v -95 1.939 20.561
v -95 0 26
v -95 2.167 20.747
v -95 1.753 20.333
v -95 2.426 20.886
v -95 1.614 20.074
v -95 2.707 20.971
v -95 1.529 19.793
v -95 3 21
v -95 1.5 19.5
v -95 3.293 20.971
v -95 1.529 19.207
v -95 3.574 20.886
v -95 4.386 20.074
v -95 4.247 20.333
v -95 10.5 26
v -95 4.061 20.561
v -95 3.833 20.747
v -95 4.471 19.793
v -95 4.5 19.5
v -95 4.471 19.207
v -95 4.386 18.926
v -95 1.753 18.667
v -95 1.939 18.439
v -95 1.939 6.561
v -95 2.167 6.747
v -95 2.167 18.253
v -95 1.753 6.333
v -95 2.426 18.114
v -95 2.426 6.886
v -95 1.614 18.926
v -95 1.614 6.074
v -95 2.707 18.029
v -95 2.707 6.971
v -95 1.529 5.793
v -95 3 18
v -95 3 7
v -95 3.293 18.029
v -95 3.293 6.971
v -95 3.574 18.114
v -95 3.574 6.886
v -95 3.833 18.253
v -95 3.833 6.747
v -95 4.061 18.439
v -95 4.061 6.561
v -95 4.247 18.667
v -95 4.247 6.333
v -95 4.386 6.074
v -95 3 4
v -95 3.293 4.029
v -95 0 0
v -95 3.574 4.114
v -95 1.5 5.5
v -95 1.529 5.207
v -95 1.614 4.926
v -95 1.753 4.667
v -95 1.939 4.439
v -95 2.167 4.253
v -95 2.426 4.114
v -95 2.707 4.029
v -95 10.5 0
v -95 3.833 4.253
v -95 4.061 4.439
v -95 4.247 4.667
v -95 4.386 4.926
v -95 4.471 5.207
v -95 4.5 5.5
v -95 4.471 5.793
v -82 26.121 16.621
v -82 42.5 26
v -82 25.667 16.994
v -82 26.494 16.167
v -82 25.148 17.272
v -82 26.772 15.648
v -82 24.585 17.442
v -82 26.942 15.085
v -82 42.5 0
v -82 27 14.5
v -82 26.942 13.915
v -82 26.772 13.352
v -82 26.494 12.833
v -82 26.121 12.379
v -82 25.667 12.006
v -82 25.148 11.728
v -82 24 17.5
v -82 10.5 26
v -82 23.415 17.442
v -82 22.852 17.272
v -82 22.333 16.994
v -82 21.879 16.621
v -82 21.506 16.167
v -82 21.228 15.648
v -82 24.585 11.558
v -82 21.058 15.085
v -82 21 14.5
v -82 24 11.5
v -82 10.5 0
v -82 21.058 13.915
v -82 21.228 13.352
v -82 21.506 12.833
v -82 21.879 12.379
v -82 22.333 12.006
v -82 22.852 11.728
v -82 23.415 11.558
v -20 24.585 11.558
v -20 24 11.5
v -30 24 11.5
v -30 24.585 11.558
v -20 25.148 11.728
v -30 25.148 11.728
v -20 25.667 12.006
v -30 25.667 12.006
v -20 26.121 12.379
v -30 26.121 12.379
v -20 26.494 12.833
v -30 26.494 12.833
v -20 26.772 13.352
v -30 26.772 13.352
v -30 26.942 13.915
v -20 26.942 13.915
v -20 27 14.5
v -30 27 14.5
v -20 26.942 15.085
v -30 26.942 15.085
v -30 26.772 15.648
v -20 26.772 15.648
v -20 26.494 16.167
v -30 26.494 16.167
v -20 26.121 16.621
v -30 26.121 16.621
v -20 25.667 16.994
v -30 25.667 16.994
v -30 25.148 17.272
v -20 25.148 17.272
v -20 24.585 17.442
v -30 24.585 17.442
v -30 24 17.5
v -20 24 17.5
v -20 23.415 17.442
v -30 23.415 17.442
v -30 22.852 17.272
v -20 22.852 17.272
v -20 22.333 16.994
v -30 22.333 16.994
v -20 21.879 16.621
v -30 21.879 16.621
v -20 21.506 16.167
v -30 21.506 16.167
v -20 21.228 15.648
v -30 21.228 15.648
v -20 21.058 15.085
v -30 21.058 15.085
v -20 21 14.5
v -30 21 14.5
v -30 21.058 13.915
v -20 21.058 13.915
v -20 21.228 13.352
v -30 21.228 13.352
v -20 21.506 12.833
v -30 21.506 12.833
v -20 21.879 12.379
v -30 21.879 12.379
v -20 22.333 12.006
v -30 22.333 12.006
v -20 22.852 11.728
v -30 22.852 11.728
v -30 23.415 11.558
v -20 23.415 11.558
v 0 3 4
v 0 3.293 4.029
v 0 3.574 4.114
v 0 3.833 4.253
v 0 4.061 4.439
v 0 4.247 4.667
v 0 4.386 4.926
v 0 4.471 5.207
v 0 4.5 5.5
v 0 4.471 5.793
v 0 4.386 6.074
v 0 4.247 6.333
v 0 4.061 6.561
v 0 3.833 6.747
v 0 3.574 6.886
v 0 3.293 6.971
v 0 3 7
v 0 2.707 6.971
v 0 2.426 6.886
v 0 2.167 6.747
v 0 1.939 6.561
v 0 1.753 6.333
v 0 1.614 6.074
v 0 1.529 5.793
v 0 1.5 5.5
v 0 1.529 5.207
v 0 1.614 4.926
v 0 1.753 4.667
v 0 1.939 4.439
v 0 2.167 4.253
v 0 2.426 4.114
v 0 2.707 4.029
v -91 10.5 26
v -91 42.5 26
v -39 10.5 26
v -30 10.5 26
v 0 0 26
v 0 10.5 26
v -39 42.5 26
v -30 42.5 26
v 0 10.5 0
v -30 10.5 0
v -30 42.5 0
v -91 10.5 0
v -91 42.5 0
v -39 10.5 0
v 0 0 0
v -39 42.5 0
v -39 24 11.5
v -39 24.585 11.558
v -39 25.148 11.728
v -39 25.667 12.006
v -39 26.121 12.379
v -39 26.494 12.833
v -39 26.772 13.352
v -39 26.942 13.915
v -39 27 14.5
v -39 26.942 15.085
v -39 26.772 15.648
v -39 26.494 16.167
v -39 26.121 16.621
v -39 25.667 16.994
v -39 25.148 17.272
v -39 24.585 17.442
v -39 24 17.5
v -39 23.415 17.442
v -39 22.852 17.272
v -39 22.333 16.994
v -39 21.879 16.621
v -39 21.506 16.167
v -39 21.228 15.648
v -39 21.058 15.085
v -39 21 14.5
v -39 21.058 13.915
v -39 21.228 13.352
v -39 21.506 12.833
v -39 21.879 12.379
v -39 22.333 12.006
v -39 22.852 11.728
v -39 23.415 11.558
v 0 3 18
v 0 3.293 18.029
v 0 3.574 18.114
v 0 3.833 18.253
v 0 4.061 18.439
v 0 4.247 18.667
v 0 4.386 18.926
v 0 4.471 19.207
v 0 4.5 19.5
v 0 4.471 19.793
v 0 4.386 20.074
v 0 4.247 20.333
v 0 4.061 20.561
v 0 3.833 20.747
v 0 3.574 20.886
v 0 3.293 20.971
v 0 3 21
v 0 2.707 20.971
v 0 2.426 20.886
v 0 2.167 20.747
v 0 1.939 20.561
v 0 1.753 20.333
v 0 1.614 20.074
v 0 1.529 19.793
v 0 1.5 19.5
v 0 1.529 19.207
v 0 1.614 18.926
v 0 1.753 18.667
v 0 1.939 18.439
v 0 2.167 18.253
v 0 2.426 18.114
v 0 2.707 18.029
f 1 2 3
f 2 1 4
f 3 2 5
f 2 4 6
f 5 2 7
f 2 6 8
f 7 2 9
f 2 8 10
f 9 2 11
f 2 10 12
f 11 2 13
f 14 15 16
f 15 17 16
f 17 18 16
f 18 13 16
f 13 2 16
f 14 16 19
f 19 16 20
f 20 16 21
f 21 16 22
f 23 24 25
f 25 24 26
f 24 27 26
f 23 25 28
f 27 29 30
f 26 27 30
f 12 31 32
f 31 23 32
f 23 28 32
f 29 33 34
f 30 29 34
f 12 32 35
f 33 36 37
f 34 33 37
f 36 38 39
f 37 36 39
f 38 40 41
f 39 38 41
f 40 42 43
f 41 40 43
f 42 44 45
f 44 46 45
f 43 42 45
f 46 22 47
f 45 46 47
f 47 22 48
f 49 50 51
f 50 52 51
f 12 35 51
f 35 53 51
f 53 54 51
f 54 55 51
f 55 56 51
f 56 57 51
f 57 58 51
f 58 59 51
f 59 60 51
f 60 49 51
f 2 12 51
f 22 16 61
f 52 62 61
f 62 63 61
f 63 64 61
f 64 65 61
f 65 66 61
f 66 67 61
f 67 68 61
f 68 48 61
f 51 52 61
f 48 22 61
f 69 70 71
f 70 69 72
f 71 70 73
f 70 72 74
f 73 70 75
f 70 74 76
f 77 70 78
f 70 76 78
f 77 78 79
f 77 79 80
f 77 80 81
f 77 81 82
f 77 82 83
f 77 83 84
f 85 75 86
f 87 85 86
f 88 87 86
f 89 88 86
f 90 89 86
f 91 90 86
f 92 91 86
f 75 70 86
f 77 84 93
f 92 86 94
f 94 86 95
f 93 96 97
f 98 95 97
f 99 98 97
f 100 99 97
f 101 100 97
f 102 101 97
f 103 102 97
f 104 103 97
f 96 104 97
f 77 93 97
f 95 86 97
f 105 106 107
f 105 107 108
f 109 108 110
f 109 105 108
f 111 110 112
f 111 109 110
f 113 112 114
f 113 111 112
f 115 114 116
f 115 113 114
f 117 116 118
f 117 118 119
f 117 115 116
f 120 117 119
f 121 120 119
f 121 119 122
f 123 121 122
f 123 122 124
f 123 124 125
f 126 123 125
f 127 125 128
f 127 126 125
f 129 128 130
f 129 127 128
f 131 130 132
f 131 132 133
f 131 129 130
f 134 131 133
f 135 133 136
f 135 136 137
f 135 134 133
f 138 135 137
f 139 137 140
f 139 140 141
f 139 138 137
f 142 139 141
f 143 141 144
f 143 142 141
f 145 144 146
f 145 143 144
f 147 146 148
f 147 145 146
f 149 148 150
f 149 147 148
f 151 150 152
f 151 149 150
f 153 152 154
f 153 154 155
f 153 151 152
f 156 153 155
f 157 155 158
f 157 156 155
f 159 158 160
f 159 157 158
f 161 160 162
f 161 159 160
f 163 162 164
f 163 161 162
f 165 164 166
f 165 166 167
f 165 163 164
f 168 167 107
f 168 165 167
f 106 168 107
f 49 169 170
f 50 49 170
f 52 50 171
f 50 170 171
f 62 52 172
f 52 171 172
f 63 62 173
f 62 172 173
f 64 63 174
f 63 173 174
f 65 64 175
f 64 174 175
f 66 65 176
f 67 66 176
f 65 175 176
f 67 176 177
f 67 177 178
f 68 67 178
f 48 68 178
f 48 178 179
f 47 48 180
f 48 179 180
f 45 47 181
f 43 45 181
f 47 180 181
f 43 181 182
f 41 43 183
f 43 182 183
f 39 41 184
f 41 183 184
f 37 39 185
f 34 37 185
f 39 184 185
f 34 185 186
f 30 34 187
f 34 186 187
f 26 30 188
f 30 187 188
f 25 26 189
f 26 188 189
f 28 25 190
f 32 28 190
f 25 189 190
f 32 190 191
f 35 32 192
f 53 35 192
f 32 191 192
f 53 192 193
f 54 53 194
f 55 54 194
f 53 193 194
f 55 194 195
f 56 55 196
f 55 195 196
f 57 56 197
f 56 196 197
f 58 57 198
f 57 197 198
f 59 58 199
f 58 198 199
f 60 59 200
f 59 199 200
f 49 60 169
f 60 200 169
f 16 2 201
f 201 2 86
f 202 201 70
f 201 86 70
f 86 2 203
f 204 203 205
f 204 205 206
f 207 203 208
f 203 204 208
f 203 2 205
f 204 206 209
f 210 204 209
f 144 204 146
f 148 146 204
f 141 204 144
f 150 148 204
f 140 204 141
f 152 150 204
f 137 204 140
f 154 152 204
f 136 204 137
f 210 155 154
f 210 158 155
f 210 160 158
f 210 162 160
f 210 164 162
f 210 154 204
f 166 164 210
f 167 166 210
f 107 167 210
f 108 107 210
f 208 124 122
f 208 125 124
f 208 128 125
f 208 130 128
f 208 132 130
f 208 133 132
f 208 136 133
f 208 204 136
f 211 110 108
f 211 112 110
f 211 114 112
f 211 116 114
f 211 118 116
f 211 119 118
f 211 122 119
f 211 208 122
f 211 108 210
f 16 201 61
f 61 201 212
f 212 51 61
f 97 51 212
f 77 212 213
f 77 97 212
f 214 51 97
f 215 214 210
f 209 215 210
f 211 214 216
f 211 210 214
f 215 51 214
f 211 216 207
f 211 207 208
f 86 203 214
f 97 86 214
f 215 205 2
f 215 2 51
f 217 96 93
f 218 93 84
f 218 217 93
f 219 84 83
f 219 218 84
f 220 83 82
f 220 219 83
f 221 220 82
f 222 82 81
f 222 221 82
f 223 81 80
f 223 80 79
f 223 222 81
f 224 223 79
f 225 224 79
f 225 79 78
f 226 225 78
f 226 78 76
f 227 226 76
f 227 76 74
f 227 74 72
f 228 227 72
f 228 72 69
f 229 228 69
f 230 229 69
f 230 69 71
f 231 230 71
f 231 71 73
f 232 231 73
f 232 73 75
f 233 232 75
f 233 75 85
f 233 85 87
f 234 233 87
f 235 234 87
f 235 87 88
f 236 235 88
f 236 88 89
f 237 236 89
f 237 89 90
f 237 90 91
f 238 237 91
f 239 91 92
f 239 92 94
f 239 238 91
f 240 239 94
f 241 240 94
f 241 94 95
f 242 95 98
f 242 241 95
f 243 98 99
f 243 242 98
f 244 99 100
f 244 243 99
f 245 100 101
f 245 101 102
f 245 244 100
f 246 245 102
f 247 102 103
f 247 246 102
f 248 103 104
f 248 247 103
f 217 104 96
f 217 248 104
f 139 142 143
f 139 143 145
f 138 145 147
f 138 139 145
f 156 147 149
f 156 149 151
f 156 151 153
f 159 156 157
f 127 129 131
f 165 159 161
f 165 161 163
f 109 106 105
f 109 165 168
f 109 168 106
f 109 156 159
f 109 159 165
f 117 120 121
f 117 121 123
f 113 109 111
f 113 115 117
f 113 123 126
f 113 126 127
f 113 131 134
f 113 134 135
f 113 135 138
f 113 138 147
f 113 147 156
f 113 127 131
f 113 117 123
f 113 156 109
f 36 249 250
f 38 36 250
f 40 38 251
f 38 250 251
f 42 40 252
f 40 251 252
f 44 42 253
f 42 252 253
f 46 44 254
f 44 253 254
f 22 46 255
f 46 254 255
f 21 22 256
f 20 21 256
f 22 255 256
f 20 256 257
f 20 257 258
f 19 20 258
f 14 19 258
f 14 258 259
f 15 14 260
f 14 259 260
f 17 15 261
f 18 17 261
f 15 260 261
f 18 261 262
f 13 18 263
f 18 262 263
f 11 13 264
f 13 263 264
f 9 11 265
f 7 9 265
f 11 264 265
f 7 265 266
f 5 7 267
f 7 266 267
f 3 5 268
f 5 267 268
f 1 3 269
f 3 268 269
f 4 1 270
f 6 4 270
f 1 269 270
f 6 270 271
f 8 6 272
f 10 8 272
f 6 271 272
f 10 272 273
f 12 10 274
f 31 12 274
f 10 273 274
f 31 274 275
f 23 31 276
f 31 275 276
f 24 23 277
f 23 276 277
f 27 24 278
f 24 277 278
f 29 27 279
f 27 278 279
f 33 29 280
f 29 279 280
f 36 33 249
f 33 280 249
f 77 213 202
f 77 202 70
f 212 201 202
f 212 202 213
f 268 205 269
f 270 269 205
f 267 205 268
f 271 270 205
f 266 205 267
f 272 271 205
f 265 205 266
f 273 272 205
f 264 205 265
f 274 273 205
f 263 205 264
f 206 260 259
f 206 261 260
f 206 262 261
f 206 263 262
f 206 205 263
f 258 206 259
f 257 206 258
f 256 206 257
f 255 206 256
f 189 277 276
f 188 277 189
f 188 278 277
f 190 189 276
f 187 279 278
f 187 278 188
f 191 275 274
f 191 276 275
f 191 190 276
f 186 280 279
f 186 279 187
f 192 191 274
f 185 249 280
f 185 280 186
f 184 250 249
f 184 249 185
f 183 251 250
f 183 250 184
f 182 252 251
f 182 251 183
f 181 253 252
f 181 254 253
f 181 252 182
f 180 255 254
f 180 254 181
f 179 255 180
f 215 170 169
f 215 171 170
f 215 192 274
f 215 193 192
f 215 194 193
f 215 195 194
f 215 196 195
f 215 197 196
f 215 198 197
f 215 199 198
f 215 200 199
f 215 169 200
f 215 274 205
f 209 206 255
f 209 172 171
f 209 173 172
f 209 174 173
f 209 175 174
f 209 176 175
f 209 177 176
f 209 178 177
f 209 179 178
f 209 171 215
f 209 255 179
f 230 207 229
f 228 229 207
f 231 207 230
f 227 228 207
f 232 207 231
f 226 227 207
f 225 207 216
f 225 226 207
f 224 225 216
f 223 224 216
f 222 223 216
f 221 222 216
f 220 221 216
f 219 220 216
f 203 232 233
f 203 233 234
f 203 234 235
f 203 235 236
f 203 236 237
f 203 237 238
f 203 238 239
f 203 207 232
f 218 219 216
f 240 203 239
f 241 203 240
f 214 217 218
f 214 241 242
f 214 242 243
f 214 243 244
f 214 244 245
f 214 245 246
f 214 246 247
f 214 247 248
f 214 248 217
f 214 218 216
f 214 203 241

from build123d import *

# Parameters (mm, degrees)
SKETCH_1_W      = 26
SKETCH_1_H      = 10.5
SKETCH_1_R      = 1.5
EXTRUDE_1_DEPTH = 95
SKETCH_2_W      = 9
SKETCH_2_H      = 26
EXTRUDE_2_DEPTH = 32
SKETCH_4_R      = 3
EXTRUDE_3_DEPTH = 52
EXTRUDE_START   = 10
SKETCH_4_5_R    = 3
EXTRUDE_4_DEPTH = 10


with BuildPart() as part:
    # 草图1 → 凸台-拉伸1 (new body)
    with BuildSketch(Plane(origin=(0, 0, 0), x_dir=(0, 0, -1), z_dir=(1, 0, 0))):
        with Locations((-13, 5.25)):
            Rectangle(SKETCH_1_W, SKETCH_1_H)
        with Locations((-19.5, 3)):
            Circle(SKETCH_1_R, mode=Mode.SUBTRACT)
        with Locations((-5.5, 3)):
            Circle(SKETCH_1_R, mode=Mode.SUBTRACT)
    extrude(amount=-EXTRUDE_1_DEPTH)

    # 草图2 → 凸台-拉伸2 (add)
    with BuildSketch(Plane(origin=(0, 10.5, 0), x_dir=(1, 0, 0), z_dir=(0, 1, 0))):
        with Locations((-34.5, -13)):
            Rectangle(SKETCH_2_W, SKETCH_2_H)
        with Locations((-86.5, -13)):
            Rectangle(SKETCH_2_W, SKETCH_2_H)
    extrude(amount=EXTRUDE_2_DEPTH)

    # 草图4 → 凸台-拉伸3 (add)
    with BuildSketch(Plane(origin=(-30, 0, 0), x_dir=(0, 0, -1), z_dir=(1, 0, 0))):
        with Locations((-14.5, 24)):
            Circle(SKETCH_4_R)
    extrude(amount=-EXTRUDE_3_DEPTH)

    # 草图4<5> → 凸台-拉伸4 (add)
    with BuildSketch(Plane(origin=(-30, 0, 0), x_dir=(0, 0, -1), z_dir=(1, 0, 0)).offset(EXTRUDE_START)):
        with Locations((-14.5, 24)):
            Circle(SKETCH_4_5_R)
    extrude(amount=-EXTRUDE_4_DEPTH)


solid = part.part
